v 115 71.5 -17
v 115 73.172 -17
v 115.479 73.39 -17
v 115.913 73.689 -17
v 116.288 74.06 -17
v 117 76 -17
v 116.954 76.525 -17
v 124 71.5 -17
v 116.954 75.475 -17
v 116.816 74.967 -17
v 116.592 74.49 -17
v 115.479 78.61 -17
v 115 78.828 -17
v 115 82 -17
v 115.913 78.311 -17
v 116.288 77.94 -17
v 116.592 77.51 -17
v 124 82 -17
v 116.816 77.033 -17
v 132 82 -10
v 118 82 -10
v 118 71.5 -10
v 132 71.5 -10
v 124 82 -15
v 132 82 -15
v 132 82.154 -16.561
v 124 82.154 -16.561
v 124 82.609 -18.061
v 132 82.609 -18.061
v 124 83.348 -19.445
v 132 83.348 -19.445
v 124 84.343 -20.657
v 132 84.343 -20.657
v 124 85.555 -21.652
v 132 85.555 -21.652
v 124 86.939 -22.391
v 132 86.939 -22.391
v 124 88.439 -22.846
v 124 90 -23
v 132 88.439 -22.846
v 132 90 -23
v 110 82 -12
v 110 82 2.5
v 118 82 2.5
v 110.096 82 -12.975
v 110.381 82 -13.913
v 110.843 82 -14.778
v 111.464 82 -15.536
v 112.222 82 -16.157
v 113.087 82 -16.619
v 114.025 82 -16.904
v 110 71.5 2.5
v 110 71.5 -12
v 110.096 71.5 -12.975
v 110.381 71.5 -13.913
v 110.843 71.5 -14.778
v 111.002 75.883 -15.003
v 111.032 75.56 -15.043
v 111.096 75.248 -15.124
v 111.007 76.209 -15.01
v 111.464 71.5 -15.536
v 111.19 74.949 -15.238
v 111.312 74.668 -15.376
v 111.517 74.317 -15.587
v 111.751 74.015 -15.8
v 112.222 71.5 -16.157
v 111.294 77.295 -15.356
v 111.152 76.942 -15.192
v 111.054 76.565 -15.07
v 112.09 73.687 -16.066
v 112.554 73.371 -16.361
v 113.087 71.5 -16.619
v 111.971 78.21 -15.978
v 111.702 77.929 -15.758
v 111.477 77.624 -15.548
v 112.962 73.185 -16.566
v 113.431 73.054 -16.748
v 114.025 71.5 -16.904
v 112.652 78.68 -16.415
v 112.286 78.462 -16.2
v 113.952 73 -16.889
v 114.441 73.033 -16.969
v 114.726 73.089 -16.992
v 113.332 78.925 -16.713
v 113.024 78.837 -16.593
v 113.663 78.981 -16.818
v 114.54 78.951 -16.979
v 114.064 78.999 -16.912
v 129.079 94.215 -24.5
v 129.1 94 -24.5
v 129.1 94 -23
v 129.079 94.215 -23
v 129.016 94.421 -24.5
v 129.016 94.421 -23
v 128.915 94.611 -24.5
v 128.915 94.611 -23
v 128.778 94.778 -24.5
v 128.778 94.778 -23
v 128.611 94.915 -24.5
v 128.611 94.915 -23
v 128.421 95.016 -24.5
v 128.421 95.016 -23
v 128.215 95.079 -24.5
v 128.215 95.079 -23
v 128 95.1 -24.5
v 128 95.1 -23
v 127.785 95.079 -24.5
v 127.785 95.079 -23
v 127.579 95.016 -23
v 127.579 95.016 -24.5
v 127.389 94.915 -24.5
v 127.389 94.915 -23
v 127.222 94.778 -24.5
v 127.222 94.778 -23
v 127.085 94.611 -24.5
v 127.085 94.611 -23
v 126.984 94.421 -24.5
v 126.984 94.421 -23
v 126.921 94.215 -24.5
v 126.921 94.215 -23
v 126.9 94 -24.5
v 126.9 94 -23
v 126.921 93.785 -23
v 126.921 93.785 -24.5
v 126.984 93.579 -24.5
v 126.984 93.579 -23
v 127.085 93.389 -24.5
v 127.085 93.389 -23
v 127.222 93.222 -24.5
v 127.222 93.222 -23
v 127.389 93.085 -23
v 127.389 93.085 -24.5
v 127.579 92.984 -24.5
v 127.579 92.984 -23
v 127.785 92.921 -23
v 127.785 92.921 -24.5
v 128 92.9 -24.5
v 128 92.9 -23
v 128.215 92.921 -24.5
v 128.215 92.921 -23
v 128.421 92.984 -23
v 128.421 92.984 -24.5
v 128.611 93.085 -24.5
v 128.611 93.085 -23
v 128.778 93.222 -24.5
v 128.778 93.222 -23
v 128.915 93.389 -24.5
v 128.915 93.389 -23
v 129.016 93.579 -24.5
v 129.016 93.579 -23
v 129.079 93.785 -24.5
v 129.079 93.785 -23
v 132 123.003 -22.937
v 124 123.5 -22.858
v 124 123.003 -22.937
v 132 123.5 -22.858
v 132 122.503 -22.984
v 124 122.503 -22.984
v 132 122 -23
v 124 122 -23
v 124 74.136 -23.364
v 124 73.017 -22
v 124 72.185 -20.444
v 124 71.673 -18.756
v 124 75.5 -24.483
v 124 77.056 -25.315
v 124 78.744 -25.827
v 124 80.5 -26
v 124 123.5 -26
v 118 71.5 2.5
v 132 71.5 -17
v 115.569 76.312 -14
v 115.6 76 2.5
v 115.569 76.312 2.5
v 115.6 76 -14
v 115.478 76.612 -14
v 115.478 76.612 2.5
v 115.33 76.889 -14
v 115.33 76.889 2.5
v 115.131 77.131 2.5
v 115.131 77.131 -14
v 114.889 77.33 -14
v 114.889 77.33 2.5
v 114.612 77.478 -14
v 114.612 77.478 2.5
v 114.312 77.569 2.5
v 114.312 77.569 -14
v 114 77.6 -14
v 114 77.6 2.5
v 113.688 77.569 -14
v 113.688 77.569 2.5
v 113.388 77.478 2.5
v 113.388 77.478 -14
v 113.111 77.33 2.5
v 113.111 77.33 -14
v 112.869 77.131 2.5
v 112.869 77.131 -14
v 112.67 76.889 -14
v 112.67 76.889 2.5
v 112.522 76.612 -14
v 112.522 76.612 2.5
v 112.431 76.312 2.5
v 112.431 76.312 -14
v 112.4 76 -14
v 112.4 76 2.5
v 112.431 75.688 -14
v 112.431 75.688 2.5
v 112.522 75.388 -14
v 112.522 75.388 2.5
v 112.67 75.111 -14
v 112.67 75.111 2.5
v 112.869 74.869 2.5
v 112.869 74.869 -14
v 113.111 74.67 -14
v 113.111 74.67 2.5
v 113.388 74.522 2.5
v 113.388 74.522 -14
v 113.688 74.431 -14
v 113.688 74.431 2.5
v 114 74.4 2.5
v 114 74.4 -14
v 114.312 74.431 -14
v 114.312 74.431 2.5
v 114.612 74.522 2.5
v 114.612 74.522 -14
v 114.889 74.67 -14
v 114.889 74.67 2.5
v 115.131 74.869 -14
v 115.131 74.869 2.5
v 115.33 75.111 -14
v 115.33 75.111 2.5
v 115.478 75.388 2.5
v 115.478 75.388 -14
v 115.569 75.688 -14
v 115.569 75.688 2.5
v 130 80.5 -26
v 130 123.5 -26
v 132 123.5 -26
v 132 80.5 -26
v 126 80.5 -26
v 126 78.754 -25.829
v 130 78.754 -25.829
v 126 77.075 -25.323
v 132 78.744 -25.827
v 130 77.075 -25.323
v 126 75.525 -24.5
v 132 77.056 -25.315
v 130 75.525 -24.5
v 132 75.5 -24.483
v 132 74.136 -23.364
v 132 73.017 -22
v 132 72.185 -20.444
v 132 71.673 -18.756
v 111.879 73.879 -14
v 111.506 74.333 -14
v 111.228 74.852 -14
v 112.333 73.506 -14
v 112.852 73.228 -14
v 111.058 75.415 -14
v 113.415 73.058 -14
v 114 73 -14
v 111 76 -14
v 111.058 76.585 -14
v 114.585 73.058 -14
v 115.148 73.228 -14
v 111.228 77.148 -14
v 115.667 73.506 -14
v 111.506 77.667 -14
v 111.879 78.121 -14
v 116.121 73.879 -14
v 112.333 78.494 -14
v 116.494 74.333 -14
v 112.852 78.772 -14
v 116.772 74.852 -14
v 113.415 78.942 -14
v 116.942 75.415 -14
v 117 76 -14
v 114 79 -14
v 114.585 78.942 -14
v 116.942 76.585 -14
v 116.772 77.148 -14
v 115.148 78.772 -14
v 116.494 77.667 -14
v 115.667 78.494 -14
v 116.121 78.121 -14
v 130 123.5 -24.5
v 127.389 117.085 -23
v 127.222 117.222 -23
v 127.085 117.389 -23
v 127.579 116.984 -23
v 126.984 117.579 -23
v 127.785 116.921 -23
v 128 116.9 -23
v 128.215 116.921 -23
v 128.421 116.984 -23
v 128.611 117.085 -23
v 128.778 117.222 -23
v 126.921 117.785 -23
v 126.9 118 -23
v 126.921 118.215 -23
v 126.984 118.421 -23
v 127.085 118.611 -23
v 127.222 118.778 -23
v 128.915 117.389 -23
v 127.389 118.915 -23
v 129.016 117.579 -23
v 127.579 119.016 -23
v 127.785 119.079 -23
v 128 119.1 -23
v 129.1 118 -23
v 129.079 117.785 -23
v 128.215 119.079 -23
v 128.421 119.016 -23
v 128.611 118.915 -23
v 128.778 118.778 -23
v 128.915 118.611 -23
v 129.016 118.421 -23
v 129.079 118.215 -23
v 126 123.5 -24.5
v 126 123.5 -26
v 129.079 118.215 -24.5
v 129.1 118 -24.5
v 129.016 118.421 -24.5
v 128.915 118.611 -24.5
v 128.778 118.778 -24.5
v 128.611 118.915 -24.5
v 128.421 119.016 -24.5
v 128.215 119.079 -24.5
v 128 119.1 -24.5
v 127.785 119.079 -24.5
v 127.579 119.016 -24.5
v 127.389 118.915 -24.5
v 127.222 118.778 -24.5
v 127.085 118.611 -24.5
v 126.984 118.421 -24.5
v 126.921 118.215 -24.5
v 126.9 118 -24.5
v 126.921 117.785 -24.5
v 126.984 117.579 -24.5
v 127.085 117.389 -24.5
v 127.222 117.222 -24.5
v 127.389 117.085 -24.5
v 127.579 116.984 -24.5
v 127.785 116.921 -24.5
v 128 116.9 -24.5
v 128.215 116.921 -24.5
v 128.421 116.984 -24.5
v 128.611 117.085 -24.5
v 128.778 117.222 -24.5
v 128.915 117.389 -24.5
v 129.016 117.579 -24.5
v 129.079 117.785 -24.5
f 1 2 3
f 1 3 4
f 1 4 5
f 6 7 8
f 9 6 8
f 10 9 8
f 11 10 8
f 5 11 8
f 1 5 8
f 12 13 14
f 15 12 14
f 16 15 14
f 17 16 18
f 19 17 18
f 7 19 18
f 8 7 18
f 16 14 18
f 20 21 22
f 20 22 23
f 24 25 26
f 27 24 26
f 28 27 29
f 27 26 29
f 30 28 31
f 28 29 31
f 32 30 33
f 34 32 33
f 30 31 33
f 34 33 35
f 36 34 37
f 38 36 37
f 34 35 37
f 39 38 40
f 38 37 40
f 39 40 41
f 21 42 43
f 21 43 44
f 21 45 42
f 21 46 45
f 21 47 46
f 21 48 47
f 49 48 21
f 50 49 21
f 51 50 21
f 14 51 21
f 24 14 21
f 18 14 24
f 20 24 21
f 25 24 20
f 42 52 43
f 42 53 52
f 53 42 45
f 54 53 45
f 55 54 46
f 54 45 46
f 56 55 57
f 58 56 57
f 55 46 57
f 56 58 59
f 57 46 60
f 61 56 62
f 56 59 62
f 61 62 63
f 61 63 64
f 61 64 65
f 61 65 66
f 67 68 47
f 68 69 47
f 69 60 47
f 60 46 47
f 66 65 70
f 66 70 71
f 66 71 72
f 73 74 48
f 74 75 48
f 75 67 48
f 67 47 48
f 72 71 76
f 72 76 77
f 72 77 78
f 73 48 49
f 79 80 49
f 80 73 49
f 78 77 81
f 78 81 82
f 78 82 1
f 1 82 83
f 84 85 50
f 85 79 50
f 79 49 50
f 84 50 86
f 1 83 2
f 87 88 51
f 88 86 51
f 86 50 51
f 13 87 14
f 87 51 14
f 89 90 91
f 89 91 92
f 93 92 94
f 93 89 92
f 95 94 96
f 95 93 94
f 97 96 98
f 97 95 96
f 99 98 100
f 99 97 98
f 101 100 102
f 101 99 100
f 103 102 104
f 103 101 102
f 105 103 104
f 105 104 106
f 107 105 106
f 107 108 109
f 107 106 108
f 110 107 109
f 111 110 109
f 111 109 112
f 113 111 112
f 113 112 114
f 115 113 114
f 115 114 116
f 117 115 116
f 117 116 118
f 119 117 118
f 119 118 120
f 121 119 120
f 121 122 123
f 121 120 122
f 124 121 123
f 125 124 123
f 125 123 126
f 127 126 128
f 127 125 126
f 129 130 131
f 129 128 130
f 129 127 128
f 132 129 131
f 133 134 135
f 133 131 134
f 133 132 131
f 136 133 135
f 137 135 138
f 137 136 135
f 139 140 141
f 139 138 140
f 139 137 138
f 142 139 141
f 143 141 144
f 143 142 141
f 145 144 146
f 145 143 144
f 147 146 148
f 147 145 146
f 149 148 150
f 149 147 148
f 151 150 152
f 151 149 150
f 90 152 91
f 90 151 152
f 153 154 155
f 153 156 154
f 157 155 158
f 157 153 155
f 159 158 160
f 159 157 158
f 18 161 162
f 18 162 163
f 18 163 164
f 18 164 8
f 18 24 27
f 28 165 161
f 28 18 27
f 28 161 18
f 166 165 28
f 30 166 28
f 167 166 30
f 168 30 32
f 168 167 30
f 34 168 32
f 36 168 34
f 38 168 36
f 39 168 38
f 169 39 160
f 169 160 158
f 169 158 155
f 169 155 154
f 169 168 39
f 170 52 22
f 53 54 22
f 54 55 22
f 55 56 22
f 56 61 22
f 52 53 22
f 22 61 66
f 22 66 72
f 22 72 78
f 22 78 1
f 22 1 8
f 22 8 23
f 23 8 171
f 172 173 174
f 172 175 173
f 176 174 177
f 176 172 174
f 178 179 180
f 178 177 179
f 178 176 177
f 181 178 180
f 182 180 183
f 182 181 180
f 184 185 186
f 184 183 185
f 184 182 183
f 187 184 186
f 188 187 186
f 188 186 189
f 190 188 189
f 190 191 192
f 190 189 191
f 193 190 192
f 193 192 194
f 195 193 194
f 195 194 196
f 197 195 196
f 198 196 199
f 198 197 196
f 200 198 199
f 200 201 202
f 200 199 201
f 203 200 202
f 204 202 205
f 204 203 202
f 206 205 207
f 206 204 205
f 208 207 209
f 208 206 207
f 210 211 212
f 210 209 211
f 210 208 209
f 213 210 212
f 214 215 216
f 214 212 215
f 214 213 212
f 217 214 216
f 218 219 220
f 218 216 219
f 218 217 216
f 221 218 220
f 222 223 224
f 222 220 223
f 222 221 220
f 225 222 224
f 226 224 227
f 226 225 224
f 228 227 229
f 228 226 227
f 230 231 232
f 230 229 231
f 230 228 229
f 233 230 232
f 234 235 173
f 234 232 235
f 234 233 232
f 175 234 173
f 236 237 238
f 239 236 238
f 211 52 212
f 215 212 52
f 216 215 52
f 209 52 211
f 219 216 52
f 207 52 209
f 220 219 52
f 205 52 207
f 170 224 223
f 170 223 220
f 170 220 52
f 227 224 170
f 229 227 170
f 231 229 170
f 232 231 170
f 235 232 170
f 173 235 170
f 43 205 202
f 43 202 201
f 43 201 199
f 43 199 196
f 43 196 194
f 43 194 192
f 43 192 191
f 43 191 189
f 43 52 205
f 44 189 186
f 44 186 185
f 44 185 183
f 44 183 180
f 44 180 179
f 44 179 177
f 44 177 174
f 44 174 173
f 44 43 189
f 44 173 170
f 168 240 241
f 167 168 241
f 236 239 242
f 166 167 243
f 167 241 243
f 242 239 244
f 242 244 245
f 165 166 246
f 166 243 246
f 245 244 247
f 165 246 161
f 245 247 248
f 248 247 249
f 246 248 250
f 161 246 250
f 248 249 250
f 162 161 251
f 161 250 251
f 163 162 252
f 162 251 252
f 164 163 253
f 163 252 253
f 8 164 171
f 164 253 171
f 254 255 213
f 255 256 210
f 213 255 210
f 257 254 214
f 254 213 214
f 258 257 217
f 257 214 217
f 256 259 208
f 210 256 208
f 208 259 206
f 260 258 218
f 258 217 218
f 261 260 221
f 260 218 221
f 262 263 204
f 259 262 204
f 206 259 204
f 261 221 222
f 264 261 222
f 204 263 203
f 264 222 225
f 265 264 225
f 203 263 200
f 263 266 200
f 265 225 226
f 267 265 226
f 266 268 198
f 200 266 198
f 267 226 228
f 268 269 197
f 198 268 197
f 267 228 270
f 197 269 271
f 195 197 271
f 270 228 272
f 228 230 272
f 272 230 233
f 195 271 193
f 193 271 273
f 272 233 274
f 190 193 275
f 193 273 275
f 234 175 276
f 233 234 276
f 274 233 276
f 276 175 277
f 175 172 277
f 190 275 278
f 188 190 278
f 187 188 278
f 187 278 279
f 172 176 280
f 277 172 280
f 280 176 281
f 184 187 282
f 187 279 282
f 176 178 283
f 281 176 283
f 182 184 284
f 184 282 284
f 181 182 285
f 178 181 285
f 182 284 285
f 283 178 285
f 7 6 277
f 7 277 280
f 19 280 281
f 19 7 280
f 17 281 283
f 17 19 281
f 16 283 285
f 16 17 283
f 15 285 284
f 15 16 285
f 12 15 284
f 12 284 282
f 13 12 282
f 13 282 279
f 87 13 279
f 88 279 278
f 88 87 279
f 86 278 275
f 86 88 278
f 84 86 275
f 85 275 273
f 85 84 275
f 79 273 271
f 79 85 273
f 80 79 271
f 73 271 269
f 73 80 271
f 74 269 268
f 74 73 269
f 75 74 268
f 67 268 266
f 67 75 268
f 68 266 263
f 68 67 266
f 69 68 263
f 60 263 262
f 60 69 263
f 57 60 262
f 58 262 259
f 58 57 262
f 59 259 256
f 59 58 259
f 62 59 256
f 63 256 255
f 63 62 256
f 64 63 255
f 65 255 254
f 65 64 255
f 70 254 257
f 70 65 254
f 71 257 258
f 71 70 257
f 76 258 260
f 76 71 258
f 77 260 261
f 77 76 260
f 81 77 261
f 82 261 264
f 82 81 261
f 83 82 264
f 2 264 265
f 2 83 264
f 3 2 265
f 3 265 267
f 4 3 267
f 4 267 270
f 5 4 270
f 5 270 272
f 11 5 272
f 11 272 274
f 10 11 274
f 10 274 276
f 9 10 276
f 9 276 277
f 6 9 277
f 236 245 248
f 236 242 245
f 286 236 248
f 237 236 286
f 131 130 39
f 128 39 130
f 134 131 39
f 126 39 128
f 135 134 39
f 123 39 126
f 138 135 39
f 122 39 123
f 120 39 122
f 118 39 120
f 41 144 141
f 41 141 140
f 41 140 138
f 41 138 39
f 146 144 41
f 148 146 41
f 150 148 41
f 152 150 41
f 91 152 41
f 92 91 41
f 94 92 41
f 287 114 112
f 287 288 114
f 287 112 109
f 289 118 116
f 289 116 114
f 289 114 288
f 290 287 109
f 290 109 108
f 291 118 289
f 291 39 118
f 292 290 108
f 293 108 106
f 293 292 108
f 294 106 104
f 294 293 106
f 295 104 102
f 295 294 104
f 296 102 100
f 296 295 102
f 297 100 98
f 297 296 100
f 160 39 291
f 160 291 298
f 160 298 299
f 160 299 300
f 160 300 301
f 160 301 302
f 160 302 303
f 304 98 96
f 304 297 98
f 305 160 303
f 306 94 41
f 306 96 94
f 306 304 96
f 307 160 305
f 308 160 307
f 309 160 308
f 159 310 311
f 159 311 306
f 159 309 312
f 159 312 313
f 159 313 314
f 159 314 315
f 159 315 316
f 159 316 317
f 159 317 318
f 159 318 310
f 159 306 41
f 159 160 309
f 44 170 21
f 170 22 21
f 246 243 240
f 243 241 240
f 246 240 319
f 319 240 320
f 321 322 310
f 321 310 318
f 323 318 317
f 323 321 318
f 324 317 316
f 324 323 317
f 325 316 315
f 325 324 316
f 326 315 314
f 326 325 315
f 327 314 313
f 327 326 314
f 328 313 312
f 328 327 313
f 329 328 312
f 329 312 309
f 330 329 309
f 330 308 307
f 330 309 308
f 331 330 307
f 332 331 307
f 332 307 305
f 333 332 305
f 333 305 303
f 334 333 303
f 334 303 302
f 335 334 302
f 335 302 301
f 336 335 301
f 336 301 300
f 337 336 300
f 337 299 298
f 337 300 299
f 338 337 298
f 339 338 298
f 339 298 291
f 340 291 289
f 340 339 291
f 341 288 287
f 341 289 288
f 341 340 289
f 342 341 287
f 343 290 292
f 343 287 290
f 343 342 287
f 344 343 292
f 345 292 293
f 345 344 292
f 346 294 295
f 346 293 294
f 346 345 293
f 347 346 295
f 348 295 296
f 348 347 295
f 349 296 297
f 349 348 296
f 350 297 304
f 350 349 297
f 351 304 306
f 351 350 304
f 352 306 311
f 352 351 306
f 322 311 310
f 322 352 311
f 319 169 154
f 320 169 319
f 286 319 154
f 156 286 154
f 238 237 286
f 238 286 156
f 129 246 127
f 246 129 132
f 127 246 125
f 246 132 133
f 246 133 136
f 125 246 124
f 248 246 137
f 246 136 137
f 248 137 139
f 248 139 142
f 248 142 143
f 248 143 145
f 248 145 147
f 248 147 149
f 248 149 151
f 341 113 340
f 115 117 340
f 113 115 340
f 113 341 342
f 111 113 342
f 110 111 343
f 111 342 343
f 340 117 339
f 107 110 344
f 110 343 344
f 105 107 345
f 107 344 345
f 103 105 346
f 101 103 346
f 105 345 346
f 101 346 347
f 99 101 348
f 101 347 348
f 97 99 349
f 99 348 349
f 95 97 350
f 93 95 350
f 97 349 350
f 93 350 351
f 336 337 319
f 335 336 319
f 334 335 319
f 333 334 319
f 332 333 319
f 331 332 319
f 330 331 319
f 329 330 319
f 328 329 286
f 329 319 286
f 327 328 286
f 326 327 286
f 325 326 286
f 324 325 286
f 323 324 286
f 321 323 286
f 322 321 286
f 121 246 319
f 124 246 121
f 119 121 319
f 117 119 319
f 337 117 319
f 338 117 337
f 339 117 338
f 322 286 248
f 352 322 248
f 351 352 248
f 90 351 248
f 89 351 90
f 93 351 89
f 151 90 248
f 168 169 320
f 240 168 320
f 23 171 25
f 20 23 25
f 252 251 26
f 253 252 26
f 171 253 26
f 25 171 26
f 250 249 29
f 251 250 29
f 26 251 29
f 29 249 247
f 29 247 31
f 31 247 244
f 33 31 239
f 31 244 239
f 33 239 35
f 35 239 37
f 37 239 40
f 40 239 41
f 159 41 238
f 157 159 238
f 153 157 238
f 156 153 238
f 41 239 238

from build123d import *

# Parameters (mm, degrees)
CYLINDER031_R     = 1.6
CYLINDER031_DEPTH = 28
BOX041_W          = 8
BOX041_H          = 10.5
BOX041_DEPTH      = 2.5
CYLINDER013_R     = 1.1
CYLINDER013_DEPTH = 28
CYLINDER012_R     = 1.1
CYLINDER012_DEPTH = 28
CYLINDER011_R     = 1.6
CYLINDER011_DEPTH = 28
CYLINDER010_R     = 3
CYLINDER010_DEPTH = 4
BOX037_W          = 8
BOX037_H          = 10.5
BOX037_DEPTH      = 10
BOX017_W          = 4
BOX017_H          = 52
BOX017_DEPTH      = 1.5
BOX016_W          = 77
BOX016_H          = 48
BOX016_DEPTH      = 40
FILLET009_R       = 8
BOX015_W          = 8
BOX015_H          = 52
BOX015_DEPTH      = 26
FILLET008_R       = 9
BOX039_W          = 15
BOX039_H          = 10.5
BOX039_DEPTH      = 7
BOX038_W          = 8
BOX038_H          = 10.5
BOX038_DEPTH      = 10
FILLET011_R       = 5


with BuildPart() as cylinder031:
    # Cylinder031 → Cylinder031 (new body)
    with BuildSketch(Plane(origin=(74, 76, -28), x_dir=(1, 0, 0), z_dir=(0, 0, 1))):
        Circle(CYLINDER031_R)
    extrude(amount=CYLINDER031_DEPTH)


with BuildPart() as cut031:
    # Box041 → Box041 (new body)
    with BuildSketch(Plane(origin=(70, 71.5, -26), x_dir=(1, 0, 0), z_dir=(0, 0, 1))):
        with Locations((4, 5.25)):
            Rectangle(BOX041_W, BOX041_H)
    extrude(amount=BOX041_DEPTH)

    # Cut031: cut Cylinder031
    add(cylinder031.part, mode=Mode.SUBTRACT)


with BuildPart() as cut031_1:
    # Cut031 placement: moved
    add(cut031.part.moved(Location((40, 0, 26))))


with BuildPart() as cylinder013:
    # Cylinder013 → Cylinder013 (new body)
    with BuildSketch(Plane(origin=(74, 118, -26), x_dir=(1, 0, 0), z_dir=(0, 0, 1))):
        Circle(CYLINDER013_R)
    extrude(amount=CYLINDER013_DEPTH)


with BuildPart() as fusion009:
    # Cylinder012 → Cylinder012 (new body)
    with BuildSketch(Plane(origin=(74, 94, -26), x_dir=(1, 0, 0), z_dir=(0, 0, 1))):
        Circle(CYLINDER012_R)
    extrude(amount=CYLINDER012_DEPTH)

    # Fusion009: union Cylinder013
    add(cylinder013.part)


with BuildPart() as fusion009_1:
    # Fusion009 placement: moved
    add(fusion009.part.moved(Location((54, 0, 0))))


with BuildPart() as cylinder011:
    # Cylinder011 → Cylinder011 (new body)
    with BuildSketch(Plane(origin=(74, 79, -26), x_dir=(1, 0, 0), z_dir=(0, 0, 1))):
        Circle(CYLINDER011_R)
    extrude(amount=CYLINDER011_DEPTH)


with BuildPart() as fusion008:
    # Cylinder010 → Cylinder010 (new body)
    with BuildSketch(Plane(origin=(74, 79, -26), x_dir=(1, 0, 0), z_dir=(0, 0, 1))):
        Circle(CYLINDER010_R)
    extrude(amount=CYLINDER010_DEPTH)

    # Fusion008: union Cylinder011
    add(cylinder011.part)


with BuildPart() as fusion008_1:
    # Fusion008 placement: moved
    add(fusion008.part.moved(Location((40, -3, 8))))


with BuildPart() as cube001:
    # Box037 → Box037 (new body)
    with BuildSketch(Plane(origin=(124, 71.5, -10), x_dir=(1, 0, 0), z_dir=(0, 0, 1))):
        with Locations((4, 5.25)):
            Rectangle(BOX037_W, BOX037_H)
    extrude(amount=BOX037_DEPTH)


with BuildPart() as box017:
    # Box017 → Box017 (new body)
    with BuildSketch(Plane(origin=(72, 71.5, -26), x_dir=(1, 0, 0), z_dir=(0, 0, 1))):
        with Locations((2, 26)):
            Rectangle(BOX017_W, BOX017_H)
    extrude(amount=BOX017_DEPTH)


with BuildPart() as fillet009:
    # Box016 → Box016 (new body)
    with BuildSketch(Plane(origin=(62, 82, -27), x_dir=(1, 0, 0), z_dir=(0, 0, 1))):
        with Locations((38.5, 24)):
            Rectangle(BOX016_W, BOX016_H)
    extrude(amount=BOX016_DEPTH)

    # Fillet009
    fillet009_edges = [fillet009.edges().sort_by_distance(p)[0] for p in [
        (100.5, 82, -27),
        (100.5, 82, 13),
        (100.5, 130, -27),
        (100.5, 130, 13),
    ]]
    fillet(fillet009_edges, radius=FILLET009_R)


with BuildPart() as fillet009_1:
    # Fillet009 placement: moved
    add(fillet009.part.moved(Location((0, 0, 4))))


with BuildPart() as cut027:
    # Box015 → Box015 (new body)
    with BuildSketch(Plane(origin=(70, 71.5, -26), x_dir=(1, 0, 0), z_dir=(0, 0, 1))):
        with Locations((4, 26)):
            Rectangle(BOX015_W, BOX015_H)
    extrude(amount=BOX015_DEPTH)

    # Cut012: cut Fillet009
    add(fillet009_1.part, mode=Mode.SUBTRACT)

    # Fillet008
    fillet008_edges = [cut027.edges().sort_by_distance(p)[0] for p in [
        (74, 71.5, -26),
    ]]
    fillet(fillet008_edges, radius=FILLET008_R)

    # Cut011: cut Box017
    add(box017.part, mode=Mode.SUBTRACT)


with BuildPart() as cut027_1:
    # Cut011 placement: moved
    add(cut027.part.moved(Location((54, 0, 0))))

    # Cut027: cut Cube001
    add(cube001.part, mode=Mode.SUBTRACT)


with BuildPart() as cube003:
    # Box039 → Box039 (new body)
    with BuildSketch(Plane(origin=(110, 71.5, -17), x_dir=(1, 0, 0), z_dir=(0, 0, 1))):
        with Locations((7.5, 5.25)):
            Rectangle(BOX039_W, BOX039_H)
    extrude(amount=BOX039_DEPTH)


with BuildPart() as fusion035:
    # Box038 → Box038 (new body)
    with BuildSketch(Plane(origin=(110, 71.5, -10), x_dir=(1, 0, 0), z_dir=(0, 0, 1))):
        with Locations((4, 5.25)):
            Rectangle(BOX038_W, BOX038_H)
    extrude(amount=BOX038_DEPTH)

    # Fusion033: union Cut027, Cube003
    add(cut027_1.part)
    add(cube003.part)

    # Fillet011
    fillet011_edges = [fusion035.edges().sort_by_distance(p)[0] for p in [
        (110, 76.75, -17),
    ]]
    fillet(fillet011_edges, radius=FILLET011_R)

    # Cut028: cut Fusion008
    add(fusion008_1.part, mode=Mode.SUBTRACT)

    # Cut029: cut Fusion009
    add(fusion009_1.part, mode=Mode.SUBTRACT)

    # Fusion035: union Cut031
    add(cut031_1.part)


solid = fusion035.part
